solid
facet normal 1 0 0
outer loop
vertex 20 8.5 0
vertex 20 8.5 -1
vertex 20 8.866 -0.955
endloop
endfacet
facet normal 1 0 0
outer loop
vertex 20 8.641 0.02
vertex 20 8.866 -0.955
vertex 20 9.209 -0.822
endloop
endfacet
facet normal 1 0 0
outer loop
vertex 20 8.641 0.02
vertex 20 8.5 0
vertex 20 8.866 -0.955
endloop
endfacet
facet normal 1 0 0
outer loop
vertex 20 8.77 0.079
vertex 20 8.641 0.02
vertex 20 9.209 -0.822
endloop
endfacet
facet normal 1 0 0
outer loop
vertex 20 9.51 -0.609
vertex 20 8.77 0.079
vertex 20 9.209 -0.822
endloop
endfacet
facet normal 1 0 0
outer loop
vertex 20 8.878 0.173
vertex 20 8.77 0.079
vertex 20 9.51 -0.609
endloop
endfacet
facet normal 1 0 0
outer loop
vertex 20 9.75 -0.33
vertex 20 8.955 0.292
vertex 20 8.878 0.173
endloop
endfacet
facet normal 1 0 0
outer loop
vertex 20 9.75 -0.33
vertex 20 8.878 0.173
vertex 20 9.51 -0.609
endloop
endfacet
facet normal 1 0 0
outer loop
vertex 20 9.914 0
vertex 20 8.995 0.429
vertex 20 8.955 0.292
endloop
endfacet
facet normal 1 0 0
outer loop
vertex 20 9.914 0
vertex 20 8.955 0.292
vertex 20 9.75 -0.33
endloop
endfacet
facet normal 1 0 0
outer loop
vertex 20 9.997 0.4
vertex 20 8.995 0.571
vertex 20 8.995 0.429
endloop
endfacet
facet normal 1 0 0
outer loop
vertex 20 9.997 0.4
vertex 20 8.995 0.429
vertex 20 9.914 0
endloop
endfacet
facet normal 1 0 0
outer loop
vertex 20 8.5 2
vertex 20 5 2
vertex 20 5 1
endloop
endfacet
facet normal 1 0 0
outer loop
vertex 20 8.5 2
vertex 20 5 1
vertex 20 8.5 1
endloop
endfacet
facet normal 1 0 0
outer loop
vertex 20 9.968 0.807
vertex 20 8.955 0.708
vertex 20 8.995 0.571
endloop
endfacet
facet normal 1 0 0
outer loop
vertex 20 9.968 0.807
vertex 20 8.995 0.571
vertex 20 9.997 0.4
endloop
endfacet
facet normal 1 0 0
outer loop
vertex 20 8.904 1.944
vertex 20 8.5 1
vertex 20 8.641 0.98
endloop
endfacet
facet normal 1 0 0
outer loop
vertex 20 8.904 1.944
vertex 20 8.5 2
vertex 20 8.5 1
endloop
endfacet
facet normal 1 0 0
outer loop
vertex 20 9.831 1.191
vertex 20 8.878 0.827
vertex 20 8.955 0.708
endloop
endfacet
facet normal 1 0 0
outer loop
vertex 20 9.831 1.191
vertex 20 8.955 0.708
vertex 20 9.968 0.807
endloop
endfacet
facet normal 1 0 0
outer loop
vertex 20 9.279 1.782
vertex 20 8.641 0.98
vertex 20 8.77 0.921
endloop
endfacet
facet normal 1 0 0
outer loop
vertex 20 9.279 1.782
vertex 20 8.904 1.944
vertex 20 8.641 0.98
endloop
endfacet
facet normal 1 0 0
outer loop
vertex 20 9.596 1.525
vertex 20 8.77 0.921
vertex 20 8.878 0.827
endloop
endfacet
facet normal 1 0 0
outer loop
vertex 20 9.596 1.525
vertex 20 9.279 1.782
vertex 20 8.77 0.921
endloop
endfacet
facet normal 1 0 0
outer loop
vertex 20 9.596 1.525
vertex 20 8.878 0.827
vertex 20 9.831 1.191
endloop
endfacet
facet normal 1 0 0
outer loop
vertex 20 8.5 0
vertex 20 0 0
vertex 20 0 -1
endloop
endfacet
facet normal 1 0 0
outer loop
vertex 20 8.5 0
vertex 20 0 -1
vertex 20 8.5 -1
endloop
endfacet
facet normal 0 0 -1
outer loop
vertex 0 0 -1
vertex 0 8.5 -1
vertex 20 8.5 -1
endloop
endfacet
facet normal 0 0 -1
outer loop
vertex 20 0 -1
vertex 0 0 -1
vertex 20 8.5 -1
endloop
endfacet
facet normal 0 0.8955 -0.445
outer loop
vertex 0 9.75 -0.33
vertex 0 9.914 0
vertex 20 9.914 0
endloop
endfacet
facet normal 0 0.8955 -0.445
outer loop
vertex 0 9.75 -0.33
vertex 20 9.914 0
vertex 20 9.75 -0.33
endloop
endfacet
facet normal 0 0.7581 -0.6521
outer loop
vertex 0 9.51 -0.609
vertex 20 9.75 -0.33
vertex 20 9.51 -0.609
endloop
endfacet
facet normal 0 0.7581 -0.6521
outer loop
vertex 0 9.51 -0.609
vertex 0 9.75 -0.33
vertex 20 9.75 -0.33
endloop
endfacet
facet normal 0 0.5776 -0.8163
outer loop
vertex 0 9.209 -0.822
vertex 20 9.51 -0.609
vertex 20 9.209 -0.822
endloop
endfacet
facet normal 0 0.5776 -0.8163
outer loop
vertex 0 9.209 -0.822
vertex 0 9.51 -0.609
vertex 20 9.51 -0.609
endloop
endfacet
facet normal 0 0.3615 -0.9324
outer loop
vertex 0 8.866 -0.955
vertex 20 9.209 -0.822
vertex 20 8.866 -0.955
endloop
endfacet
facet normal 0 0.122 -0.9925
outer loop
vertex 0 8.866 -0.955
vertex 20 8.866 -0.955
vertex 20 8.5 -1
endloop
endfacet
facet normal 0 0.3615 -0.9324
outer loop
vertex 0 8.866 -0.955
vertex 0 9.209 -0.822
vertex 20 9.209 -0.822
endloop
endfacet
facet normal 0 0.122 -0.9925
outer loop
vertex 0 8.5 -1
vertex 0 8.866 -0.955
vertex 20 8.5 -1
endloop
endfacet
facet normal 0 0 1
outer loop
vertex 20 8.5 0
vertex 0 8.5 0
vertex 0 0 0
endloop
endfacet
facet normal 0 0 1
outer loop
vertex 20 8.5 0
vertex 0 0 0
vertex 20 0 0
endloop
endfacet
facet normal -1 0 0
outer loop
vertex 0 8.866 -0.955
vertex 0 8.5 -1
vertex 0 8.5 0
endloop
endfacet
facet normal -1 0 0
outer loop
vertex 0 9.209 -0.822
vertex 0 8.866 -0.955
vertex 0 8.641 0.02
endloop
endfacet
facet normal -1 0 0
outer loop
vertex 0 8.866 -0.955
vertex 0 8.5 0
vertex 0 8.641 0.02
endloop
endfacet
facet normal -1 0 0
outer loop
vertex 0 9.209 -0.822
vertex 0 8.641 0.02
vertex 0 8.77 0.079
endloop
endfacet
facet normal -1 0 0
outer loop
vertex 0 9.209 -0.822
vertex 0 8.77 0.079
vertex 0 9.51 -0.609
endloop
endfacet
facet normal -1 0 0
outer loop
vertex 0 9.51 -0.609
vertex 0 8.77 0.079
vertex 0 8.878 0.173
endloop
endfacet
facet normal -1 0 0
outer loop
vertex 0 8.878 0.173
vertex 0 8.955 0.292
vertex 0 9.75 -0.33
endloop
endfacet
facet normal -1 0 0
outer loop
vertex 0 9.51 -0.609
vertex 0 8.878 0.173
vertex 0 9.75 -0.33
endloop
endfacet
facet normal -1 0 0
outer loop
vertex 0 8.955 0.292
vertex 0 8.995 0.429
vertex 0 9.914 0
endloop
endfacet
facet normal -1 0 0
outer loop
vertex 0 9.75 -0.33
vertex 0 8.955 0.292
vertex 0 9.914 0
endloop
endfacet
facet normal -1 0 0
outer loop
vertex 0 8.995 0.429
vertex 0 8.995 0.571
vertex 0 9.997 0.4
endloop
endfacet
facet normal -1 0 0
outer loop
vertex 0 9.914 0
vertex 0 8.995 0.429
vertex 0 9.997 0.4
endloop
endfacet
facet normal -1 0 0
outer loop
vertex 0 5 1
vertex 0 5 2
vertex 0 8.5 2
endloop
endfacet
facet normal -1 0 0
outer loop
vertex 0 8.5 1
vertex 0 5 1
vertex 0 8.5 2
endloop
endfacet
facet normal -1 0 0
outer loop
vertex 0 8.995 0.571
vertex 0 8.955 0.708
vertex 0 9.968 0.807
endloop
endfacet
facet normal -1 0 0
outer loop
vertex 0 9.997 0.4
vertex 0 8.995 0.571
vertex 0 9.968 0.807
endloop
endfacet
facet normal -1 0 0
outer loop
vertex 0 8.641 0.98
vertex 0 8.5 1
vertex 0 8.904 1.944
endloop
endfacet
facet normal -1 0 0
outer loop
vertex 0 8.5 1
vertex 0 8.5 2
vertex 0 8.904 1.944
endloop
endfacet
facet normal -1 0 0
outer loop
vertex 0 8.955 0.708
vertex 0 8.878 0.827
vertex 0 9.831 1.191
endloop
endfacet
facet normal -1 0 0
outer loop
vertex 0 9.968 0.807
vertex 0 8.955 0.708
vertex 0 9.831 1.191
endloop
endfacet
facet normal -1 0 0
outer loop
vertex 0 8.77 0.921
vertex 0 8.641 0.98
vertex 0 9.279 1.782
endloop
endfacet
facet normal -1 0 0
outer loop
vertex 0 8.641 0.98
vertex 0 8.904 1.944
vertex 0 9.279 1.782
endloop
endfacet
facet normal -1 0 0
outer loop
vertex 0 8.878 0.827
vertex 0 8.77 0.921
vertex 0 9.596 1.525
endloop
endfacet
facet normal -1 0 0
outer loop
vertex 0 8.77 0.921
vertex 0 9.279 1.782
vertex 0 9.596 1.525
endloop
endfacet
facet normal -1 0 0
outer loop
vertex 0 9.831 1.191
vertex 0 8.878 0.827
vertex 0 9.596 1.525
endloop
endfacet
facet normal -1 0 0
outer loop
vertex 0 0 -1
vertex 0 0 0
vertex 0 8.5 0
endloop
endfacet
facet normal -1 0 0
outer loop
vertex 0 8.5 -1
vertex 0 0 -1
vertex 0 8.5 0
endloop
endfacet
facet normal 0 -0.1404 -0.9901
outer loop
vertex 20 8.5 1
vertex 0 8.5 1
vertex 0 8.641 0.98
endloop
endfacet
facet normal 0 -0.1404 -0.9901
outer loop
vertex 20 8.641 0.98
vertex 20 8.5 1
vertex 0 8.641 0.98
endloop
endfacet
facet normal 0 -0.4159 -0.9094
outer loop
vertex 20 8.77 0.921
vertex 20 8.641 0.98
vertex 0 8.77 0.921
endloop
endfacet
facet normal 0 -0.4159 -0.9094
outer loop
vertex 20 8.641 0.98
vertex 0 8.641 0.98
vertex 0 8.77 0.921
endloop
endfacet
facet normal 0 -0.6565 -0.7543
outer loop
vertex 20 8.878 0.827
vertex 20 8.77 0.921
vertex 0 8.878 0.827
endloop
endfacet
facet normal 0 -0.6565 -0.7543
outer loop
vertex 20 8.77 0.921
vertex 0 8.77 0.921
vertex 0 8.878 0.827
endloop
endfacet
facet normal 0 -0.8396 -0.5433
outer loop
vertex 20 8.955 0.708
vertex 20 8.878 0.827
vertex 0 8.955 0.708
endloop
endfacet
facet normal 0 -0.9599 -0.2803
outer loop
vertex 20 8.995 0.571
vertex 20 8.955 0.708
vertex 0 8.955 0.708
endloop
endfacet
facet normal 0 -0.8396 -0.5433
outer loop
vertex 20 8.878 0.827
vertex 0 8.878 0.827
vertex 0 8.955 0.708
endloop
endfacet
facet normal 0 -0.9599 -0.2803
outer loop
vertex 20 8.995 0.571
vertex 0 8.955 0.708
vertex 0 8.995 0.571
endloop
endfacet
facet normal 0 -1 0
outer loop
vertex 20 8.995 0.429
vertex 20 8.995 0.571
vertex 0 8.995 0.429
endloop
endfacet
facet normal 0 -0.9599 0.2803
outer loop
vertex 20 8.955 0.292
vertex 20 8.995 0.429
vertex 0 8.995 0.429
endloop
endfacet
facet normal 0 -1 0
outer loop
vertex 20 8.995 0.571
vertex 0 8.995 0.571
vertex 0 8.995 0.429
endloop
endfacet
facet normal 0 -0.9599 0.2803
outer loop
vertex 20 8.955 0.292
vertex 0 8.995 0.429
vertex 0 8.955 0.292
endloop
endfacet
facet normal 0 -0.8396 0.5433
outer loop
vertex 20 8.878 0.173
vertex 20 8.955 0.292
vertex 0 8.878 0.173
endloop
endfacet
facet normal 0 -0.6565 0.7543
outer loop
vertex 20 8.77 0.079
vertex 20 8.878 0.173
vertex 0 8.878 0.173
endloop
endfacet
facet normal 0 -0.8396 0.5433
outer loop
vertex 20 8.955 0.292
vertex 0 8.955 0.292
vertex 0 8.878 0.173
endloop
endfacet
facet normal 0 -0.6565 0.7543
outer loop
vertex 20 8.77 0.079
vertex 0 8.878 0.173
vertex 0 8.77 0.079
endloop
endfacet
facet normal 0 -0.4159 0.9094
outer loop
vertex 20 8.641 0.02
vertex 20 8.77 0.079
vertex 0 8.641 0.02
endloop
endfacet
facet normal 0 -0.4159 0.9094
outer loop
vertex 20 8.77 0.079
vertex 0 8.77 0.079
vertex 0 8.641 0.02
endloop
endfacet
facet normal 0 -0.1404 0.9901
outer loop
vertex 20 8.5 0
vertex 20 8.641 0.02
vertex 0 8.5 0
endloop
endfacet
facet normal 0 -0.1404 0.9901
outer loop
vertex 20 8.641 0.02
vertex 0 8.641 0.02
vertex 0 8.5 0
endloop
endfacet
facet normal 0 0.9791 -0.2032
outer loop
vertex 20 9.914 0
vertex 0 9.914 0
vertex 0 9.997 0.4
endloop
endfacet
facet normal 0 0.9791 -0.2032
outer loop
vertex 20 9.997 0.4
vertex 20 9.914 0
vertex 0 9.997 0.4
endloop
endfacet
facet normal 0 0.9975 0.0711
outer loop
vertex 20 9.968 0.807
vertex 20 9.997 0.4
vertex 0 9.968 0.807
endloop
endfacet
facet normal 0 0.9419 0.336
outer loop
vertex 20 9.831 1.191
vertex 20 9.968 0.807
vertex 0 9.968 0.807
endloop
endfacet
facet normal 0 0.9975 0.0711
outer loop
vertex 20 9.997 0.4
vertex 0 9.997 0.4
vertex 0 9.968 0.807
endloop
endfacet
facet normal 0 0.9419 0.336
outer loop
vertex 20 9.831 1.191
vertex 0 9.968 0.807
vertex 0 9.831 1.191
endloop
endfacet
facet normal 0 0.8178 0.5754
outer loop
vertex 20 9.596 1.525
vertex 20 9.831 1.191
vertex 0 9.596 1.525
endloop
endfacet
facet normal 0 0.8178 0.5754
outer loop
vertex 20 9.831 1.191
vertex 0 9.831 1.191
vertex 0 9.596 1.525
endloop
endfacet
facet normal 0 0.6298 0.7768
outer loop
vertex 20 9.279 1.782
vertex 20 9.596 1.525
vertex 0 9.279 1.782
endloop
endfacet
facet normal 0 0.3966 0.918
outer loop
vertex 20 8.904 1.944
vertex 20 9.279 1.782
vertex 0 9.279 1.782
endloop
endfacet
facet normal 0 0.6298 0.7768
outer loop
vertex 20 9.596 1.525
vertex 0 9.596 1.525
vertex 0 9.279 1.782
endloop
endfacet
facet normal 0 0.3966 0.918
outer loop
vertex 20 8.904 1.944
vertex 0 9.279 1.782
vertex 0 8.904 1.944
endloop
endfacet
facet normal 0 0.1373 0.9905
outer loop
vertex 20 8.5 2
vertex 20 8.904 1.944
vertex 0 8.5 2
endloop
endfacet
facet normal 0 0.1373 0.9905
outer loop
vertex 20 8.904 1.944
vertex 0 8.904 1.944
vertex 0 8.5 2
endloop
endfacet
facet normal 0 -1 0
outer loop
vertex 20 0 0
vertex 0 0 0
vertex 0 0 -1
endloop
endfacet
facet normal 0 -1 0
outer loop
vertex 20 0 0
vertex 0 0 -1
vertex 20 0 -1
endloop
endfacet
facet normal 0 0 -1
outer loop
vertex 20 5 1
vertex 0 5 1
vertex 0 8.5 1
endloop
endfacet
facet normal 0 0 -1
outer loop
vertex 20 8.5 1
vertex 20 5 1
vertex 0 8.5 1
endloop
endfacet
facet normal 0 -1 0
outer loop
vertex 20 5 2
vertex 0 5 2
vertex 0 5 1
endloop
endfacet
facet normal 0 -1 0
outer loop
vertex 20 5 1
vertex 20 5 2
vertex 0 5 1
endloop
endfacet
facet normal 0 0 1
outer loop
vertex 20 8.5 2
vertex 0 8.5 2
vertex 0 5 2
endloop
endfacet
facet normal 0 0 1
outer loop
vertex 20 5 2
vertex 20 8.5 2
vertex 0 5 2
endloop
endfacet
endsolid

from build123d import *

# Parameters (mm, degrees)
SKETCH_1_W       = 20
SKETCH_1_H       = 10
BASEPLATE_DEPTH  = 1
HEM_OPEN_DEPTH   = 20
HEM_OPEN_2_DEPTH = 20


# Read off the part's stored shape, not the designer's step: Hem_open
# Sheet-metal steps are written as plain solids
with BuildPart() as part:
    # Sketch 1 → BasePlate (new body)
    with BuildSketch(Plane.XY):
        with Locations((10, 5)):
            Rectangle(SKETCH_1_W, SKETCH_1_H)
    extrude(amount=-BASEPLATE_DEPTH)

    # Hem_open outline → Hem_open (cut)
    with BuildSketch(Plane.YZ):
        with BuildLine():
            Line((10, 0), (9.914213562, 0))
            ThreePointArc((9.914213562, 0), (9.366025404, -0.724744871), (8.5, -1))
            Line((8.5, -1), (10, -1))
            Line((10, -1), (10, 0))
        make_face()
    extrude(amount=HEM_OPEN_DEPTH, mode=Mode.SUBTRACT)

    # Hem_open 2 outline → Hem_open 2 (add)
    with BuildSketch(Plane.YZ):
        with BuildLine():
            Line((5, 2), (5, 1))
            Line((5, 1), (8.5, 1))
            ThreePointArc((8.5, 1), (9, 0.5), (8.5, 0))
            Line((8.5, 0), (9.914213562, 0))
            ThreePointArc((9.914213562, 0), (9.724744871, 1.366025404), (8.5, 2))
            Line((8.5, 2), (5, 2))
        make_face()
    extrude(amount=HEM_OPEN_2_DEPTH)


solid = part.part
